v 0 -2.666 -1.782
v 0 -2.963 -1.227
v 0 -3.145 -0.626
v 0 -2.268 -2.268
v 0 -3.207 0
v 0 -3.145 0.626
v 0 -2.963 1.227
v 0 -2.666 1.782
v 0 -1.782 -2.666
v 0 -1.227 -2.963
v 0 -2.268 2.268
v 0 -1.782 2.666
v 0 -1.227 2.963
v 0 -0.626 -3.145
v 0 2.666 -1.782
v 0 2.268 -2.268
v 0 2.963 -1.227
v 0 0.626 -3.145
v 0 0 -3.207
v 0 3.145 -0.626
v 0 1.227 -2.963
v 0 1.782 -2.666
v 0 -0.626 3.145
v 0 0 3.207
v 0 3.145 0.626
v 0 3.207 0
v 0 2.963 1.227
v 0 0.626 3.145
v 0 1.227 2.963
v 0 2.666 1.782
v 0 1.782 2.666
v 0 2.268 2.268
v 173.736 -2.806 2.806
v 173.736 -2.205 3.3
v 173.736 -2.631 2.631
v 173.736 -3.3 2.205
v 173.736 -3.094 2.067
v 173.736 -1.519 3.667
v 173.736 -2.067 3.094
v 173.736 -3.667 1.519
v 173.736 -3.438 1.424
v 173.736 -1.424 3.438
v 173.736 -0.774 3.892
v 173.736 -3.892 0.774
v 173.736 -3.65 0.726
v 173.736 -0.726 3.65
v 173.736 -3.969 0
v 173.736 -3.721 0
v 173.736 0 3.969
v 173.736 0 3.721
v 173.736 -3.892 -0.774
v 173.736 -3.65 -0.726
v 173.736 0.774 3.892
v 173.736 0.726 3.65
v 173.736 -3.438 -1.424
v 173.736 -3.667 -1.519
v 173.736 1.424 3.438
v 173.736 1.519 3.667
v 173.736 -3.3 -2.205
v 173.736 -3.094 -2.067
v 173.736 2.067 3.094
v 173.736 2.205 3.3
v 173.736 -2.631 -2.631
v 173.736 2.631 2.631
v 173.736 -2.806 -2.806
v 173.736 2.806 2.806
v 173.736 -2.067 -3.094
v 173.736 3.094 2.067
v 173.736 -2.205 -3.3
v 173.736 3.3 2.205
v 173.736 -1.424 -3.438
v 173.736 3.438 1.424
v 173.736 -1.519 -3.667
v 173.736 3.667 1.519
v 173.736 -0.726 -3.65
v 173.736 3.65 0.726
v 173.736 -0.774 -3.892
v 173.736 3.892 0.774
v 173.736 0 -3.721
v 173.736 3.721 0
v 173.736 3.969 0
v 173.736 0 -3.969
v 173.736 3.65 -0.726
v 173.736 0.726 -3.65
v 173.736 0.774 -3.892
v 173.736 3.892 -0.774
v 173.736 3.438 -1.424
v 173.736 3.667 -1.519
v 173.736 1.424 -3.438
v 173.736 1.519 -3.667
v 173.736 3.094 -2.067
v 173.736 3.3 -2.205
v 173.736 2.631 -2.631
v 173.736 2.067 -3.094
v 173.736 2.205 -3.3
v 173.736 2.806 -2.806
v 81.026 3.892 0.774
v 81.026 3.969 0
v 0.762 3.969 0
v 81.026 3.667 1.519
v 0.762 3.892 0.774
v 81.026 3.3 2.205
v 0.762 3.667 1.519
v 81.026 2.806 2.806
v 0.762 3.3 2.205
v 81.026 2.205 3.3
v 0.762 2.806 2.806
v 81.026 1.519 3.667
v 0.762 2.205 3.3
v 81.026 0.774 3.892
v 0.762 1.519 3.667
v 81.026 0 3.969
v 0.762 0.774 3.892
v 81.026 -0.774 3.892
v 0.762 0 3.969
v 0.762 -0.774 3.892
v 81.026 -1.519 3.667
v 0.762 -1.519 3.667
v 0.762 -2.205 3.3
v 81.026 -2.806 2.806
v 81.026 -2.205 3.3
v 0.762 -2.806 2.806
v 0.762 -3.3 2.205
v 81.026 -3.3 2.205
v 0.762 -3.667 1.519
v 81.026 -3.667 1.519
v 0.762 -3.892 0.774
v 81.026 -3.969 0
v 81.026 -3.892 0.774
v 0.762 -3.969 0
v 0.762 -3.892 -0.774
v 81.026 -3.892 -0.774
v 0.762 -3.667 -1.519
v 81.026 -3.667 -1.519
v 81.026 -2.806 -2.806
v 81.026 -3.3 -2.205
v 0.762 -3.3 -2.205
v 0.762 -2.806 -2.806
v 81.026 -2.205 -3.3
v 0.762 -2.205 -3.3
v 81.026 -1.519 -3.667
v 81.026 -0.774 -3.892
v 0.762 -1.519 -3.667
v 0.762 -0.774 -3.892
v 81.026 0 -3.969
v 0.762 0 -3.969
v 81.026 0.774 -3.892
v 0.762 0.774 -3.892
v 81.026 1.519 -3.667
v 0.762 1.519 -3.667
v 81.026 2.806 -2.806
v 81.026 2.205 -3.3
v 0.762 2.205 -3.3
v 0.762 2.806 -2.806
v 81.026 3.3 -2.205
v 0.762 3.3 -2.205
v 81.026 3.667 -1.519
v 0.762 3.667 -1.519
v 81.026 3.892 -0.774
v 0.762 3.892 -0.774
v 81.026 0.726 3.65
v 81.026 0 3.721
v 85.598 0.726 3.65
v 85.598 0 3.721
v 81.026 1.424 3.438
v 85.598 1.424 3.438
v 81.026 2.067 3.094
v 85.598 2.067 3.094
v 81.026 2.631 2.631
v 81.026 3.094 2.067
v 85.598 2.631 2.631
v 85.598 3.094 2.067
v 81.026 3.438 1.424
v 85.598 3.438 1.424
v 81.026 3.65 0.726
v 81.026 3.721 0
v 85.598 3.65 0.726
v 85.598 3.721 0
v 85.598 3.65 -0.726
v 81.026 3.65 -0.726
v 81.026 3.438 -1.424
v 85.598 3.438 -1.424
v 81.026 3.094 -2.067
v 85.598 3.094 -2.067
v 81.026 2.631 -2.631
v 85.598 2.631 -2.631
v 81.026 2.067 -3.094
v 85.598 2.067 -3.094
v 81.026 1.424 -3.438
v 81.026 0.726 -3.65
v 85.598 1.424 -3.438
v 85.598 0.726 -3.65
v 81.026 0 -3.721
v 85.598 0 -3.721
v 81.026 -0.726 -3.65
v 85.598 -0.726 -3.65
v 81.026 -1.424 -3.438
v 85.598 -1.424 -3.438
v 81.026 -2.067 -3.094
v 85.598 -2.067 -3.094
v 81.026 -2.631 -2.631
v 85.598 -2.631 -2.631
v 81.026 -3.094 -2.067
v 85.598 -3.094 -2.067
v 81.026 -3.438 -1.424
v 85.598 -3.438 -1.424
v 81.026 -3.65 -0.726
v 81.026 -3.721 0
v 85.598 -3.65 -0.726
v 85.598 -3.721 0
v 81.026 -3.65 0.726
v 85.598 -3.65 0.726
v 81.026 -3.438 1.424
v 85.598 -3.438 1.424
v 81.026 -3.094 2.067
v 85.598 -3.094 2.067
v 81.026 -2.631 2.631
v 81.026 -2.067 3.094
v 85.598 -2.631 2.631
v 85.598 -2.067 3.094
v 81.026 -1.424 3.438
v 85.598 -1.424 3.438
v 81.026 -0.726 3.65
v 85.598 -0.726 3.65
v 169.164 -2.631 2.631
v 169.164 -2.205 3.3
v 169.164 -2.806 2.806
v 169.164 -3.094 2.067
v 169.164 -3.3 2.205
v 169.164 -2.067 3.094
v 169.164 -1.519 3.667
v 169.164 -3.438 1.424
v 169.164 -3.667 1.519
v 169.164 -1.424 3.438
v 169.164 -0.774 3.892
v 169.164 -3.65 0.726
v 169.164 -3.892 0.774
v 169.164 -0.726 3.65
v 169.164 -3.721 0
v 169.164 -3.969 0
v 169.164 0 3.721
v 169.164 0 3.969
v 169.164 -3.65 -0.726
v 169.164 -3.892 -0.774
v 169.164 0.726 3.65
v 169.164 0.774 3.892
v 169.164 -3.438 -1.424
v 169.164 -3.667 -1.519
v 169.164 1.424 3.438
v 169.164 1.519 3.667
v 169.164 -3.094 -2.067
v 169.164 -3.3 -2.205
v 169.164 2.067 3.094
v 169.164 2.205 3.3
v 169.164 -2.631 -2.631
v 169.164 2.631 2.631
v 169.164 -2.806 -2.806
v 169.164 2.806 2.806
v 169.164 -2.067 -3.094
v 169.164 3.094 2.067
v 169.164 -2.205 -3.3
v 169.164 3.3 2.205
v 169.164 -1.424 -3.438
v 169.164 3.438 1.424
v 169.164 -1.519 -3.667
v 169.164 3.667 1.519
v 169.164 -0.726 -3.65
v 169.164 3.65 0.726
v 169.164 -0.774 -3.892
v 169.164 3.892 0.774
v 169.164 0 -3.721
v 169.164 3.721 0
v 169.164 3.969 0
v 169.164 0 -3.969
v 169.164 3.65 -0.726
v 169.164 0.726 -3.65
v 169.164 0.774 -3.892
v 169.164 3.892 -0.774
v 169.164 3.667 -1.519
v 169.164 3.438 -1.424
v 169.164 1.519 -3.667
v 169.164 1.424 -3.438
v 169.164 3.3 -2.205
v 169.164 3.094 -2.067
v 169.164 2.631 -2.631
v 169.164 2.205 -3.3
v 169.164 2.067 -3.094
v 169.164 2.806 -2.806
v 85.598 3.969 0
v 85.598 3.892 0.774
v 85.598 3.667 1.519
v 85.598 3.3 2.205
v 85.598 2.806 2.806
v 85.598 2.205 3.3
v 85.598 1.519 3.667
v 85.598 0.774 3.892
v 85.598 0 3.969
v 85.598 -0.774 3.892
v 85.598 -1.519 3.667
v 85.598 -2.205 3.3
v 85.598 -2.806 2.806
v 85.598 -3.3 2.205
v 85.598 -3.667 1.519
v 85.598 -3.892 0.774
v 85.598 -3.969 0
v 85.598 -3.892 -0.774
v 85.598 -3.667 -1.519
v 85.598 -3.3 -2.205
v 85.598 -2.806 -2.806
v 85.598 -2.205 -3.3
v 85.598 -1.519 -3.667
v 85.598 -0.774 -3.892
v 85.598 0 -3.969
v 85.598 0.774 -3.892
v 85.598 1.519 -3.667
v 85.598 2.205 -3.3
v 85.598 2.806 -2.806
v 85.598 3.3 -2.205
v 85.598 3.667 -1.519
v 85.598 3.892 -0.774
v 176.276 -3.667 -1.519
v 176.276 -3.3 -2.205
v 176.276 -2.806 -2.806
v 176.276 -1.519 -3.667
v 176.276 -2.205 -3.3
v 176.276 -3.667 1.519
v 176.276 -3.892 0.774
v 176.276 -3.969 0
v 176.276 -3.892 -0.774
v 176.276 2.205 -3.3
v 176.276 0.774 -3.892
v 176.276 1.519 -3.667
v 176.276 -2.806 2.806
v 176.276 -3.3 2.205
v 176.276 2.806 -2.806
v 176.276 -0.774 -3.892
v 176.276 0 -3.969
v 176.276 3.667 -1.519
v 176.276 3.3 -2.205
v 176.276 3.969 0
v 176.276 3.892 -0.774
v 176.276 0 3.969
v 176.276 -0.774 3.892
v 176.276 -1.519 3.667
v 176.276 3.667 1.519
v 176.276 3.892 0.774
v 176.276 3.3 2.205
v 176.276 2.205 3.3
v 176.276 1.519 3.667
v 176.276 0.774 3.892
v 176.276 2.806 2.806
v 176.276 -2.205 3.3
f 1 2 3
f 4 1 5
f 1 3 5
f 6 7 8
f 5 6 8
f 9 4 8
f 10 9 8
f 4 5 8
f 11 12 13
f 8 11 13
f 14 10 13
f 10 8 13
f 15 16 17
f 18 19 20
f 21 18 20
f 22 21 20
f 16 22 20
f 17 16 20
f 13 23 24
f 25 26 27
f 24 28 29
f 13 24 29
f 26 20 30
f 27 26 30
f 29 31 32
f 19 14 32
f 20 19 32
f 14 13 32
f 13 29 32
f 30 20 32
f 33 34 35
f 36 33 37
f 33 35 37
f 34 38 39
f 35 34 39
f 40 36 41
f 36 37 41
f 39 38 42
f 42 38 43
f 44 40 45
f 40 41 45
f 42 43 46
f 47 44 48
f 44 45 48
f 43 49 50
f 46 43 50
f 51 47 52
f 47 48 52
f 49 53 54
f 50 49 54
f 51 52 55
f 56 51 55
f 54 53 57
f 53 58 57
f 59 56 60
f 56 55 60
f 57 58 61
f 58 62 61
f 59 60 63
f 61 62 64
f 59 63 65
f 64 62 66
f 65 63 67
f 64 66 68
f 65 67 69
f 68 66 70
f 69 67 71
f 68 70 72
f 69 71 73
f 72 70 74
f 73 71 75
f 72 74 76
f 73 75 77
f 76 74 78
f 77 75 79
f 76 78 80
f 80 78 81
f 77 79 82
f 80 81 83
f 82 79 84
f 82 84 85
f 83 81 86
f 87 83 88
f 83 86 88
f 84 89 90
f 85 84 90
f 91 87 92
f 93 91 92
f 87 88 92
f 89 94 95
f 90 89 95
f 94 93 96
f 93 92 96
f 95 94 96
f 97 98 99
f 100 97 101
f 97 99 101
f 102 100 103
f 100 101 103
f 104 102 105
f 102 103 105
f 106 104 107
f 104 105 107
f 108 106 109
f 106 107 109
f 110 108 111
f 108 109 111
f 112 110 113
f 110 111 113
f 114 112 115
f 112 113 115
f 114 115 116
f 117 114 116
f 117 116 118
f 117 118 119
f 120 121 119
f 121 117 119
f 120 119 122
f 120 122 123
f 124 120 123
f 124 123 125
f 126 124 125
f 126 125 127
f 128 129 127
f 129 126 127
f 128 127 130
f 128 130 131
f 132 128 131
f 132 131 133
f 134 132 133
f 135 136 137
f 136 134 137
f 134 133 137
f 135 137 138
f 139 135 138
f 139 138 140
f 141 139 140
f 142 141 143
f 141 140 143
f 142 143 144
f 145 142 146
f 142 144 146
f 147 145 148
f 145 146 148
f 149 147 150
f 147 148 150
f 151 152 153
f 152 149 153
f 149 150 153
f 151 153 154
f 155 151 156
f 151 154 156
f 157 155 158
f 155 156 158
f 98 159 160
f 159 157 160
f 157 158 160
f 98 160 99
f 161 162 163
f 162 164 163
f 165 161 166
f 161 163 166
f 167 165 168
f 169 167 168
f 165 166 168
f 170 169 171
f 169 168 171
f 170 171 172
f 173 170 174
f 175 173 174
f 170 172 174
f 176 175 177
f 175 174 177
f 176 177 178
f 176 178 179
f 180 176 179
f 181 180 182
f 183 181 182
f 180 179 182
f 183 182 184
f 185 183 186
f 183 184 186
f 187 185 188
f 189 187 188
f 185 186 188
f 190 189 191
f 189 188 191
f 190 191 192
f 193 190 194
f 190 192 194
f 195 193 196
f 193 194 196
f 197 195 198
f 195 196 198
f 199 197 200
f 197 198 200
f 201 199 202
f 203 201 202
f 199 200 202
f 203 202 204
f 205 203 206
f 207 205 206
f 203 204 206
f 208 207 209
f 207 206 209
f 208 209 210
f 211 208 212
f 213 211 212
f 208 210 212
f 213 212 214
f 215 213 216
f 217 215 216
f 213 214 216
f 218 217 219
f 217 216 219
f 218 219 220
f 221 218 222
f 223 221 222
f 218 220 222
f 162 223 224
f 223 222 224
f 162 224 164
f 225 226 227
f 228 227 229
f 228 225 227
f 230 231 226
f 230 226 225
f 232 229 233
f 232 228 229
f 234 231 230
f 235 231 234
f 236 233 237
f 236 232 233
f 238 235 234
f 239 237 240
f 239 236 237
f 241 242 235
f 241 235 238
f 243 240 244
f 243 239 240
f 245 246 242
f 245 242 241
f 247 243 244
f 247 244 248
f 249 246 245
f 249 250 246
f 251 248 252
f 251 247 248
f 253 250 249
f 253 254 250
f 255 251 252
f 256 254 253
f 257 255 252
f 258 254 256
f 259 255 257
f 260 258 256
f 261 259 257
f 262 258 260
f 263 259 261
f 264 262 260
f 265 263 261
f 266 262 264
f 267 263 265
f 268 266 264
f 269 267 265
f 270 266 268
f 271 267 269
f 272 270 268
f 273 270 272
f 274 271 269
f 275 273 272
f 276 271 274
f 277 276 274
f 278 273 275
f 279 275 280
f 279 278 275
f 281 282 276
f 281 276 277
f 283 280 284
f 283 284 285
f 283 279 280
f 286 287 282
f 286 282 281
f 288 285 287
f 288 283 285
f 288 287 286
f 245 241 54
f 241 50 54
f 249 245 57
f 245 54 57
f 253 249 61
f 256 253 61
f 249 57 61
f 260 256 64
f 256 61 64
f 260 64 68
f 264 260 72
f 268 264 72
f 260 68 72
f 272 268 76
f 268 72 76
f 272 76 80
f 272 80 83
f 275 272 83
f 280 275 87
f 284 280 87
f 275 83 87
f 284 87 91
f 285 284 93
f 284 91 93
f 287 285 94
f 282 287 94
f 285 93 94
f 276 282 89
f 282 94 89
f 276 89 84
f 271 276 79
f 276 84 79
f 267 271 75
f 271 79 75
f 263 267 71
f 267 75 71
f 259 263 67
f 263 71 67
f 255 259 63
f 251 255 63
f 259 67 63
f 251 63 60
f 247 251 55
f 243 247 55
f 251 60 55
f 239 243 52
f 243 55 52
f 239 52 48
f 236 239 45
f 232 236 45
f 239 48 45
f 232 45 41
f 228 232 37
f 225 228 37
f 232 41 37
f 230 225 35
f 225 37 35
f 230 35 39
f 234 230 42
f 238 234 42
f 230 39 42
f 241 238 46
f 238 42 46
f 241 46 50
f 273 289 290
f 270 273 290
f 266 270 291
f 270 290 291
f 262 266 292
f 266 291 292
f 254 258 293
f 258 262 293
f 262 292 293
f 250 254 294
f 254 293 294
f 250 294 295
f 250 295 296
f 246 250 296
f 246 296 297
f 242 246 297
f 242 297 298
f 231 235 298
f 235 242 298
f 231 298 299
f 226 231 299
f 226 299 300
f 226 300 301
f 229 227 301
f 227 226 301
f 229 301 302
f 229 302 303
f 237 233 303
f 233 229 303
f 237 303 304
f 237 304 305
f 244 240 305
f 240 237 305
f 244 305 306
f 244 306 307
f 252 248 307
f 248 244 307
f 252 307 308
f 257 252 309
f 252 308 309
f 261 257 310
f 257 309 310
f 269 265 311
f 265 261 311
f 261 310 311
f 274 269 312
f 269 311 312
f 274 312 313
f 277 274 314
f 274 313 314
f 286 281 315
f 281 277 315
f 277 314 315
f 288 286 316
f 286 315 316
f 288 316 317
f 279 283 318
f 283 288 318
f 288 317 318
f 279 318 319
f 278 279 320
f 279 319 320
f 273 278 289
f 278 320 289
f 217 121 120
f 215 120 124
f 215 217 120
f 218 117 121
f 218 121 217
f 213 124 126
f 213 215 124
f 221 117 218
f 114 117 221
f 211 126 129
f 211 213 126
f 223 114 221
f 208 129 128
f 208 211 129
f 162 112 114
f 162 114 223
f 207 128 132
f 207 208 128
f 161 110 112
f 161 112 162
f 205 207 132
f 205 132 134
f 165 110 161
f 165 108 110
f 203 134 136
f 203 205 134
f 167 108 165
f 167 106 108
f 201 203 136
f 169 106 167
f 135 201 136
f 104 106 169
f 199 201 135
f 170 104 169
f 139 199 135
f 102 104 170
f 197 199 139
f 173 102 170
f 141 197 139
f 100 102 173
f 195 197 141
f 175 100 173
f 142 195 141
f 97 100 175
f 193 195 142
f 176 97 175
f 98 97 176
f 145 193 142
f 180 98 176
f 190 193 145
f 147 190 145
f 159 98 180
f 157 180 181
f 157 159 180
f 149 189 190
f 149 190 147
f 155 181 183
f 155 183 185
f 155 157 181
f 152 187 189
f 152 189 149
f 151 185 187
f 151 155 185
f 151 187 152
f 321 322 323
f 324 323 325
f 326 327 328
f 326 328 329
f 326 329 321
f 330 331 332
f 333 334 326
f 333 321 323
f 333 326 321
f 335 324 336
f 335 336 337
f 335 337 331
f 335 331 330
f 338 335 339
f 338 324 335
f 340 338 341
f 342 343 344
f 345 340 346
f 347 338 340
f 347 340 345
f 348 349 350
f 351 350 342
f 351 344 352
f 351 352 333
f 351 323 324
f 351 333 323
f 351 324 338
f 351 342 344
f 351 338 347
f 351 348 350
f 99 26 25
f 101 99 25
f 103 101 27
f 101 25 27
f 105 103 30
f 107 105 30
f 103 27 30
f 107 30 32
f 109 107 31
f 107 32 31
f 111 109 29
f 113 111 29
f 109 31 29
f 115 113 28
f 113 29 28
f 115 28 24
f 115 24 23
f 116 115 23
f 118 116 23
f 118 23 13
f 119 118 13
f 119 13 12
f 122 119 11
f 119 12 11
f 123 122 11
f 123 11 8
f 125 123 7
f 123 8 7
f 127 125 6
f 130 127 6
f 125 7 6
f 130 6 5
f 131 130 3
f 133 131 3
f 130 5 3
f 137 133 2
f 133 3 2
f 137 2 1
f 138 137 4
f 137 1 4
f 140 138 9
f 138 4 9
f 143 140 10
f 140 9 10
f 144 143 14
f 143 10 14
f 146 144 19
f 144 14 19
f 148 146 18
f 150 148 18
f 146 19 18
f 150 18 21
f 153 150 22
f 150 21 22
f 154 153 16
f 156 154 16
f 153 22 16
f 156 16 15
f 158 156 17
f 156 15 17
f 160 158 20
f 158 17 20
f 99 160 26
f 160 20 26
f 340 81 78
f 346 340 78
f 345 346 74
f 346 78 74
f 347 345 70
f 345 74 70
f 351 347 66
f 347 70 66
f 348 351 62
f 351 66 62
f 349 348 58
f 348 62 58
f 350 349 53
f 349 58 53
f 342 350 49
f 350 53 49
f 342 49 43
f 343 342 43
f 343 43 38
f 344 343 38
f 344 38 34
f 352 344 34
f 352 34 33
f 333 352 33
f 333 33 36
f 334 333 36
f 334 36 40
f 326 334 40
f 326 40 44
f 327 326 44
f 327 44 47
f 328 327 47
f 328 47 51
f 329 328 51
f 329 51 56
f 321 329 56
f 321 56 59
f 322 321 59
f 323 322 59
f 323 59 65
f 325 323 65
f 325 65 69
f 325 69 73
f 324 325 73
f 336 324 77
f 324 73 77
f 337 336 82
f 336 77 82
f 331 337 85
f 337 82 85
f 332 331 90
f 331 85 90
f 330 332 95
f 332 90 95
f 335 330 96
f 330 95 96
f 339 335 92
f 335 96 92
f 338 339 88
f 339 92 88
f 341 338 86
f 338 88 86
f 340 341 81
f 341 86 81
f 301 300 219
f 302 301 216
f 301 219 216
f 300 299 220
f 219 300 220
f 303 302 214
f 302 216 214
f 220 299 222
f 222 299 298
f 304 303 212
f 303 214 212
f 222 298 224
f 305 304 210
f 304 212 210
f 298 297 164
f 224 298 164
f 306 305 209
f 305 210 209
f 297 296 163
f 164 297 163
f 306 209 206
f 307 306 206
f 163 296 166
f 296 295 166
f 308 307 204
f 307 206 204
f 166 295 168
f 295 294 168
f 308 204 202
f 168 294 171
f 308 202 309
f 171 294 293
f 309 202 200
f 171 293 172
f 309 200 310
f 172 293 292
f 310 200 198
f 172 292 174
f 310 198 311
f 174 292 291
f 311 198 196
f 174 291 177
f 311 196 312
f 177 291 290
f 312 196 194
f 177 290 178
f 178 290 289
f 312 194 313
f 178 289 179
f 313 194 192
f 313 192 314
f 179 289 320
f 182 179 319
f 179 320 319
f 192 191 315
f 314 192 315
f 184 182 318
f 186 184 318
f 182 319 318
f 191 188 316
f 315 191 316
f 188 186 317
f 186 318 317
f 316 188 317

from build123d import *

# Parameters (mm, degrees)
F0_R     = 3.96875
F1_DEPTH = 176.276
F2_W     = 4.572
F2_H     = 1.702164
F4_SIZE2 = 0.762
F4_SIZE  = 0.762


with BuildPart() as f1:
    # F0 (on Right) → F1 (new body)
    with BuildSketch(Plane.YZ):
        Circle(F0_R)
    extrude(amount=F1_DEPTH)

    # F2 (on Front) → F3 (revolve, cut)
    with BuildSketch(Plane.XZ):
        with Locations((171.45, 4.572182)):
            Rectangle(F2_W, F2_H)
        with Locations((83.312, 4.572182)):
            Rectangle(F2_W, F2_H)
    revolve(axis=Axis((171.45, 0, 0), (-1, 0, 0)), mode=Mode.SUBTRACT)

    # F4
    f4_edges = [f1.edges().sort_by_distance(p)[0] for p in [
        (0, -3.96875, 0),
    ]]
    chamfer(f4_edges, length=F4_SIZE, length2=F4_SIZE2)


solid = f1.part
